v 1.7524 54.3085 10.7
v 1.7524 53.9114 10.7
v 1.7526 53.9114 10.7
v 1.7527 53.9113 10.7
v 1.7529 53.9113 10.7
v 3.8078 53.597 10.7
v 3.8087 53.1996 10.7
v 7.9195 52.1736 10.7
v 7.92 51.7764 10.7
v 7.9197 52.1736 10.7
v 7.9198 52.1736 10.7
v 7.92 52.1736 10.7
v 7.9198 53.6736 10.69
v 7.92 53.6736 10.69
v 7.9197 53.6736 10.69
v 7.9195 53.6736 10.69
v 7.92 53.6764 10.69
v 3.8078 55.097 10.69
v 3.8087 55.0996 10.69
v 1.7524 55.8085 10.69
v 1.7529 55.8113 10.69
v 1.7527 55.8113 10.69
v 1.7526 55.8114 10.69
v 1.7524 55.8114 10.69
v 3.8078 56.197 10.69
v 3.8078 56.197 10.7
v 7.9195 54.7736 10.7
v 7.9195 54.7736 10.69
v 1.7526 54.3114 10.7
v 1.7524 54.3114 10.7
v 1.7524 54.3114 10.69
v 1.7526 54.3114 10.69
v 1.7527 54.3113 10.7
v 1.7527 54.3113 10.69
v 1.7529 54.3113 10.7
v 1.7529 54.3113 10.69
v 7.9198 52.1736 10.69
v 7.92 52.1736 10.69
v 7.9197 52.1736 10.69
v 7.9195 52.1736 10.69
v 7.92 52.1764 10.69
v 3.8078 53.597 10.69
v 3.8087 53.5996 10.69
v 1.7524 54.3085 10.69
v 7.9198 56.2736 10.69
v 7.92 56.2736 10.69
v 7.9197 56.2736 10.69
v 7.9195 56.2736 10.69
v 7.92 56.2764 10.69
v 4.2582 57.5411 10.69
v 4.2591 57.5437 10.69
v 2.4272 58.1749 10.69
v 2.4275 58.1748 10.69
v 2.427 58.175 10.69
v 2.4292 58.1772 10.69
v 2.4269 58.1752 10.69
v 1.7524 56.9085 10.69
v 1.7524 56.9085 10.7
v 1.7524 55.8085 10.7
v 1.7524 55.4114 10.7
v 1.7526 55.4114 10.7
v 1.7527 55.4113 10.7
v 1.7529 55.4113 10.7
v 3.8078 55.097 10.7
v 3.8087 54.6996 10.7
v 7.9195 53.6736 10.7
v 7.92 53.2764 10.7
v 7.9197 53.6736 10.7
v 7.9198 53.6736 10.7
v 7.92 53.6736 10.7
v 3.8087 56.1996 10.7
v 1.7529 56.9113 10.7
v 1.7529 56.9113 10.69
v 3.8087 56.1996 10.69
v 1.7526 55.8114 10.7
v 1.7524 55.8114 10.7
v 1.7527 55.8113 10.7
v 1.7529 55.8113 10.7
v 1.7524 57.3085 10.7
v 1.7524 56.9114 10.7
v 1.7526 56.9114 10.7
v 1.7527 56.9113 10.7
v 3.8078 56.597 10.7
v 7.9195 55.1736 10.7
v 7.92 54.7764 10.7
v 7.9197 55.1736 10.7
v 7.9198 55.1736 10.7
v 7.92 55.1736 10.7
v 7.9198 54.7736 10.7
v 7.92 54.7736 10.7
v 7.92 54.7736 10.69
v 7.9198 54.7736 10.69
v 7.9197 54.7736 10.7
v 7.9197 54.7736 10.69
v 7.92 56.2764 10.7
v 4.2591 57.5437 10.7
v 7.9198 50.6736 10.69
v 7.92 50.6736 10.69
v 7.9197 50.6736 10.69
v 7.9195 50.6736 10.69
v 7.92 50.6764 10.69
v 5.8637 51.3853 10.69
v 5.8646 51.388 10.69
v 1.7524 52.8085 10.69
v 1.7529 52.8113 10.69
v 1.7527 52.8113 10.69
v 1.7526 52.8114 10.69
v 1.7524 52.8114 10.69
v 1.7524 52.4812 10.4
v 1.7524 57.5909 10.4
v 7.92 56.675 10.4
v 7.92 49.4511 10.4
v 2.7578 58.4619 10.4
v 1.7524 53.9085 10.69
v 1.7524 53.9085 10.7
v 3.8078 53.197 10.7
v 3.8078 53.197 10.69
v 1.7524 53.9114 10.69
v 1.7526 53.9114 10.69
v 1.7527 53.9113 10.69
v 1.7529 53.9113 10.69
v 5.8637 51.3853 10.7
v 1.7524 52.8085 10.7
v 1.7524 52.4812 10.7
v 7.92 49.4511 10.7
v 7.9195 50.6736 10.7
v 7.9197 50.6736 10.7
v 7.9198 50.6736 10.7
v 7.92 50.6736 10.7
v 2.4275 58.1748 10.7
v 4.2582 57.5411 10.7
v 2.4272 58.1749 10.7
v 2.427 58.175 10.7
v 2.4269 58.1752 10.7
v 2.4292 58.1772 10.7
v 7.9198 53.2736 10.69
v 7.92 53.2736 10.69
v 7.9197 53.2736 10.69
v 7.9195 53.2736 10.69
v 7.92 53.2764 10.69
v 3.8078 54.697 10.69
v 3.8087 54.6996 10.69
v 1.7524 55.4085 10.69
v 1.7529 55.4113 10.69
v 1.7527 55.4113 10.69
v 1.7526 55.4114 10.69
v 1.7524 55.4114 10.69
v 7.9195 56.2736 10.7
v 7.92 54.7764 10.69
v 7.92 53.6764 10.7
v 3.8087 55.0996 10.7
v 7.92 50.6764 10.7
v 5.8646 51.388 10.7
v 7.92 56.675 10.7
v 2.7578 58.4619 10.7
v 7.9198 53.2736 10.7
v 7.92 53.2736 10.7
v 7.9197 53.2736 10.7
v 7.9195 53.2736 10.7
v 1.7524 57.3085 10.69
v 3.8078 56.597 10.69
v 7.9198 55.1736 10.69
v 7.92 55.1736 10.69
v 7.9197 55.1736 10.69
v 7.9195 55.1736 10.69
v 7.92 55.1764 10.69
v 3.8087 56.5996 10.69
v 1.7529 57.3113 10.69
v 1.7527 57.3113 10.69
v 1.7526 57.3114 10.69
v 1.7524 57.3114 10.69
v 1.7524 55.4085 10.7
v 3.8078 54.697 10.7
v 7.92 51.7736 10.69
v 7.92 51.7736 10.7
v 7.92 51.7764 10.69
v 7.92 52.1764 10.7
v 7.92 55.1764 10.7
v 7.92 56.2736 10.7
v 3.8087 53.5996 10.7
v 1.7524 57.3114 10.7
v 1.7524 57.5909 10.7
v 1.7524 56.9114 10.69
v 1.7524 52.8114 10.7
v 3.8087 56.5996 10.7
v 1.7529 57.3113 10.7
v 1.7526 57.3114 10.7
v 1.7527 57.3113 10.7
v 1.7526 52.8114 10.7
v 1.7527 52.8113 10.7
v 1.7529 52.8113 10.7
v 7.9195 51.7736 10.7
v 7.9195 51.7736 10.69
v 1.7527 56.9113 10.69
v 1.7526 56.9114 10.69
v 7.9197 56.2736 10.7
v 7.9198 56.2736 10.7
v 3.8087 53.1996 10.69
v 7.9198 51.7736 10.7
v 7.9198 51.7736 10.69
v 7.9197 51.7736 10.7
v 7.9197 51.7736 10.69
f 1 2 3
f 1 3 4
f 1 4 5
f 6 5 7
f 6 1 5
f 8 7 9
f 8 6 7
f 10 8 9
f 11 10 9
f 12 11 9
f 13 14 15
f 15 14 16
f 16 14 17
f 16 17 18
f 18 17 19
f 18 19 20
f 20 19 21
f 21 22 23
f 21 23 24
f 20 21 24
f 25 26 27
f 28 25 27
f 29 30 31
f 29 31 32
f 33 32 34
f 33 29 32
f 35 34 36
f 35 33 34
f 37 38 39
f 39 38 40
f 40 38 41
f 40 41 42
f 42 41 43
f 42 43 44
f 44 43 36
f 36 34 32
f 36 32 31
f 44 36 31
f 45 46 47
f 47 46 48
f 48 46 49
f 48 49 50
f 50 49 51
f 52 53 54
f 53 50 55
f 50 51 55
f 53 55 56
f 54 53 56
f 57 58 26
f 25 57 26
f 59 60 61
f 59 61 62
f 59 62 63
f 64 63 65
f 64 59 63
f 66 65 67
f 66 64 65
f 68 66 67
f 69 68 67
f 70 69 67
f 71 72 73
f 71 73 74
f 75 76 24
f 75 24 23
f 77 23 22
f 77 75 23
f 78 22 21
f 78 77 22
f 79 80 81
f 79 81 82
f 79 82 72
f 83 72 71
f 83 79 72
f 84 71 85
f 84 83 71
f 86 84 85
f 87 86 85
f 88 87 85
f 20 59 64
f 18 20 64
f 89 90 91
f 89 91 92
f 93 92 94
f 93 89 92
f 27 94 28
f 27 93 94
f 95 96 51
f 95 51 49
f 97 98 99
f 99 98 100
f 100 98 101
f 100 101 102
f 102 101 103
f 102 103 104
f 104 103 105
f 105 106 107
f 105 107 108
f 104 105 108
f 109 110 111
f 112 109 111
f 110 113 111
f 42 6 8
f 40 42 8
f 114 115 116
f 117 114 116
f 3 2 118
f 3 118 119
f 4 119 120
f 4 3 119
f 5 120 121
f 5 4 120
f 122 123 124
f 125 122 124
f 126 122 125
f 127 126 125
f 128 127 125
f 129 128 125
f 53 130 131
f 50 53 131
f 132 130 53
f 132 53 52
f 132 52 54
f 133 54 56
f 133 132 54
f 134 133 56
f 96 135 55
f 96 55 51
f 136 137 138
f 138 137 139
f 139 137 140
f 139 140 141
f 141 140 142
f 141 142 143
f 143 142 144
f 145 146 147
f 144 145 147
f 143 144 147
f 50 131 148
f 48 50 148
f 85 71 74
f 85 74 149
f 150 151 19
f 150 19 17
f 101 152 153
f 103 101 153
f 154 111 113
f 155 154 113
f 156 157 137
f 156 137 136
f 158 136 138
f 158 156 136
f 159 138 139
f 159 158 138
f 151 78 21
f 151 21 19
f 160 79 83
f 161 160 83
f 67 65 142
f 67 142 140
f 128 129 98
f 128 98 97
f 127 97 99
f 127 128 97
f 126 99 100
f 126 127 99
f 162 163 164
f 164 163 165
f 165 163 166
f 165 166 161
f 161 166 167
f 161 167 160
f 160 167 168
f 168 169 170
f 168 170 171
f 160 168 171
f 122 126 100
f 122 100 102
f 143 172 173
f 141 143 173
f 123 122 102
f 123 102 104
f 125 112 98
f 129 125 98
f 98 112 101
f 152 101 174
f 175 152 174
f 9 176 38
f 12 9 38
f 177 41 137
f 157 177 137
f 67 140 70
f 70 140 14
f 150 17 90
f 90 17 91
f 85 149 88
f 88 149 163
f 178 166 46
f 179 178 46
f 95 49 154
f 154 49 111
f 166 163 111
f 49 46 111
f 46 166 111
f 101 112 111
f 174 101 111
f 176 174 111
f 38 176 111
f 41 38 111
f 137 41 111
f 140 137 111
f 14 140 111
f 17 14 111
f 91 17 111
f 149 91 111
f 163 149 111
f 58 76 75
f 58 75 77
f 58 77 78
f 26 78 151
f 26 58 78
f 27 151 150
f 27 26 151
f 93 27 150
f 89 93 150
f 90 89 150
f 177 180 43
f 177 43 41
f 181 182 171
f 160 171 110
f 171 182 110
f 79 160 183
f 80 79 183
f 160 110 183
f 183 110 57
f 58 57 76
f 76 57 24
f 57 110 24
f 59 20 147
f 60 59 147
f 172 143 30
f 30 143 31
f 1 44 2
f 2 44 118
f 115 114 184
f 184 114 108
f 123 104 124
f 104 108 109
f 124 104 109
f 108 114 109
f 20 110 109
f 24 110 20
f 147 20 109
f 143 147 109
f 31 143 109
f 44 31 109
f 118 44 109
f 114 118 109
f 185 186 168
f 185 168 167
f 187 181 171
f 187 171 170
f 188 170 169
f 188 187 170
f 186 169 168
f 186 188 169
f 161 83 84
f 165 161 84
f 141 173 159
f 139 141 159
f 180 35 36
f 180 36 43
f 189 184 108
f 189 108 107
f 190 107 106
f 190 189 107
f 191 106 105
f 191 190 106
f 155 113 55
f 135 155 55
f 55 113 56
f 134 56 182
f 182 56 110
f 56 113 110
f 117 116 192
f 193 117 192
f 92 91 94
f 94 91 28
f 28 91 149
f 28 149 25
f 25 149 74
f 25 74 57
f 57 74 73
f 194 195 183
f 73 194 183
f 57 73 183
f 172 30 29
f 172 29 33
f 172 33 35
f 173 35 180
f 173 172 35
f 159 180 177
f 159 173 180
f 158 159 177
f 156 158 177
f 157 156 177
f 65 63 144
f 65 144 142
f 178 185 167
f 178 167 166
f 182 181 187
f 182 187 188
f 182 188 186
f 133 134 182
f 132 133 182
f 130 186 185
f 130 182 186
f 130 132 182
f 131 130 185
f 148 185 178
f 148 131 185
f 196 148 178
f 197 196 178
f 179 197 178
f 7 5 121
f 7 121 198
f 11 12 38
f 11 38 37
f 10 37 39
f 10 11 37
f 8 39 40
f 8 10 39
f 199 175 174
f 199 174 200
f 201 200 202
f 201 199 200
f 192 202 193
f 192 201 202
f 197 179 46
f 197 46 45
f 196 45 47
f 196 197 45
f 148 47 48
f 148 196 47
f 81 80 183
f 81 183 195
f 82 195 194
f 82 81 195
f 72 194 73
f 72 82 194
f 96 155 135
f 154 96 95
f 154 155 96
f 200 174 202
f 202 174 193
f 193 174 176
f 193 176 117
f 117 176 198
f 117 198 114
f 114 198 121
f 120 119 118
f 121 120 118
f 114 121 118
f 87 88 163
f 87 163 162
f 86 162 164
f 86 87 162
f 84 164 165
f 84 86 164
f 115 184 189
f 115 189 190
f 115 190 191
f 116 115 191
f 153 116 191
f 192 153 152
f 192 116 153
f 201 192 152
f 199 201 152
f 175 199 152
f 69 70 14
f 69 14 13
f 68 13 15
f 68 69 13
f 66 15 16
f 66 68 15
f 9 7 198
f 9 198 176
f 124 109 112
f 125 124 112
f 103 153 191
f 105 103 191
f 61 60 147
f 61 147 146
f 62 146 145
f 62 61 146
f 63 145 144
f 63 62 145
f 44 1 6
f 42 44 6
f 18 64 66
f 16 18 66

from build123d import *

# Parameters (mm, degrees)
PAD002_DEPTH    = 0.3
POCKET008_DEPTH = 0.01
POCKET009_DEPTH = 0.01


with BuildPart() as part:
    # Sketch009 (on Face1 of Binder002) → Pad002 (new body)
    with BuildSketch(Plane.XY.offset(10.4)):
        Polygon((1.7523997574, 57.5908510487), (1.7523997574, 52.4812141451), (7.92, 49.4510973901), (7.92, 56.6749555236), (2.7578069465, 58.4619401658), align=None)
    extrude(amount=PAD002_DEPTH)

    # Sketch010 (on Face7 of Pad002) → Pocket008 (cut)
    with BuildSketch(Plane.XY.offset(10.7)):
        with BuildLine():
            ThreePointArc((2.4274707916, 58.1748075445), (2.4266041369, 58.1765918899), (2.4283884823, 58.1774585447))
            Line((2.4283884823, 58.1774585447), (4.2590786033, 57.5437327043))
            Line((4.2590786033, 57.5437327043), (7.9204588453, 56.2762810237))
            ThreePointArc((7.9204588453, 56.2762810237), (7.9213255001, 56.2744966783), (7.9195411547, 56.2736300236))
            Line((4.2581609127, 57.5410817042), (7.9195411547, 56.2736300236))
            Line((2.4274707916, 58.1748075445), (4.2581609127, 57.5410817042))
        make_face()
        with BuildLine():
            ThreePointArc((7.9204588453, 50.6762810237), (7.9213255001, 50.6744966783), (7.9195411547, 50.6736300236))
            Line((7.9195411547, 50.6736300236), (5.8636744071, 51.3853047451))
            Line((5.8636744071, 51.3853047451), (1.7519409121, 52.8086541883))
            ThreePointArc((1.7519409121, 52.8086541883), (1.7510742574, 52.8104385337), (1.7528586028, 52.8113051884))
            Line((5.8645920978, 51.3879557453), (1.7528586028, 52.8113051884))
            Line((7.9204588453, 50.6762810237), (5.8645920978, 51.3879557453))
        make_face()
        with BuildLine():
            ThreePointArc((1.7519409121, 53.9086541883), (1.7510742574, 53.9104385337), (1.7528586028, 53.9113051884))
            Line((1.7528586028, 53.9113051884), (3.8087253503, 53.1996304668))
            Line((3.8087253503, 53.1996304668), (7.9204588453, 51.7762810237))
            ThreePointArc((7.9204588453, 51.7762810237), (7.9213255001, 51.7744966783), (7.9195411547, 51.7736300236))
            Line((3.8078076596, 53.1969794667), (7.9195411547, 51.7736300236))
            Line((1.7519409121, 53.9086541883), (3.8078076596, 53.1969794667))
        make_face()
        with BuildLine():
            ThreePointArc((1.7519409121, 54.3086541883), (1.7510742574, 54.3104385337), (1.7528586028, 54.3113051884))
            Line((1.7528586028, 54.3113051884), (3.8087253503, 53.5996304668))
            Line((3.8087253503, 53.5996304668), (7.9204588453, 52.1762810237))
            ThreePointArc((7.9204588453, 52.1762810237), (7.9213255001, 52.1744966783), (7.9195411547, 52.1736300236))
            Line((3.8078076596, 53.5969794667), (7.9195411547, 52.1736300236))
            Line((1.7519409121, 54.3086541883), (3.8078076596, 53.5969794667))
        make_face()
        with BuildLine():
            ThreePointArc((1.7519409121, 55.4086541883), (1.7510742574, 55.4104385337), (1.7528586028, 55.4113051884))
            Line((1.7528586028, 55.4113051884), (3.8087253503, 54.6996304668))
            Line((3.8087253503, 54.6996304668), (7.9204588453, 53.2762810237))
            ThreePointArc((7.9204588453, 53.2762810237), (7.9213255001, 53.2744966783), (7.9195411547, 53.2736300236))
            Line((3.8078076596, 54.6969794667), (7.9195411547, 53.2736300236))
            Line((1.7519409121, 55.4086541883), (3.8078076596, 54.6969794667))
        make_face()
        with BuildLine():
            ThreePointArc((1.7519409121, 55.8086541883), (1.7510742574, 55.8104385337), (1.7528586028, 55.8113051884))
            Line((1.7528586028, 55.8113051884), (3.8087253503, 55.0996304668))
            Line((3.8087253503, 55.0996304668), (7.9204588453, 53.6762810237))
            ThreePointArc((7.9204588453, 53.6762810237), (7.9213255001, 53.6744966783), (7.9195411547, 53.6736300236))
            Line((3.8078076596, 55.0969794667), (7.9195411547, 53.6736300236))
            Line((1.7519409121, 55.8086541883), (3.8078076596, 55.0969794667))
        make_face()
        with BuildLine():
            ThreePointArc((1.7519409121, 56.9086541883), (1.7510742574, 56.9104385337), (1.7528586028, 56.9113051884))
            Line((1.7528586028, 56.9113051884), (3.8087253503, 56.1996304668))
            Line((3.8087253503, 56.1996304668), (7.9204588453, 54.7762810237))
            ThreePointArc((7.9204588453, 54.7762810237), (7.9213255001, 54.7744966783), (7.9195411547, 54.7736300236))
            Line((3.8078076596, 56.1969794667), (7.9195411547, 54.7736300236))
            Line((1.7519409121, 56.9086541883), (3.8078076596, 56.1969794667))
        make_face()
        with BuildLine():
            ThreePointArc((1.7519409121, 57.3086541883), (1.7510742574, 57.3104385337), (1.7528586028, 57.3113051884))
            Line((1.7528586028, 57.3113051884), (3.8087253503, 56.5996304668))
            Line((3.8087253503, 56.5996304668), (7.9204588453, 55.1762810237))
            ThreePointArc((7.9204588453, 55.1762810237), (7.9213255001, 55.1744966783), (7.9195411547, 55.1736300236))
            Line((3.8078076596, 56.5969794667), (7.9195411547, 55.1736300236))
            Line((1.7519409121, 57.3086541883), (3.8078076596, 56.5969794667))
        make_face()
    extrude(amount=-POCKET008_DEPTH, mode=Mode.SUBTRACT)

    # Sketch010 (on Face7 of Pad002) → Pocket009 (cut)
    with BuildSketch(Plane.XY.offset(10.7)):
        with BuildLine():
            ThreePointArc((2.4274707916, 58.1748075445), (2.4266041369, 58.1765918899), (2.4283884823, 58.1774585447))
            Line((2.4283884823, 58.1774585447), (4.2590786033, 57.5437327043))
            Line((4.2590786033, 57.5437327043), (7.9204588453, 56.2762810237))
            ThreePointArc((7.9204588453, 56.2762810237), (7.9213255001, 56.2744966783), (7.9195411547, 56.2736300236))
            Line((4.2581609127, 57.5410817042), (7.9195411547, 56.2736300236))
            Line((2.4274707916, 58.1748075445), (4.2581609127, 57.5410817042))
        make_face()
        with BuildLine():
            ThreePointArc((7.9204588453, 50.6762810237), (7.9213255001, 50.6744966783), (7.9195411547, 50.6736300236))
            Line((7.9195411547, 50.6736300236), (5.8636744071, 51.3853047451))
            Line((5.8636744071, 51.3853047451), (1.7519409121, 52.8086541883))
            ThreePointArc((1.7519409121, 52.8086541883), (1.7510742574, 52.8104385337), (1.7528586028, 52.8113051884))
            Line((5.8645920978, 51.3879557453), (1.7528586028, 52.8113051884))
            Line((7.9204588453, 50.6762810237), (5.8645920978, 51.3879557453))
        make_face()
        with BuildLine():
            ThreePointArc((1.7519409121, 53.9086541883), (1.7510742574, 53.9104385337), (1.7528586028, 53.9113051884))
            Line((1.7528586028, 53.9113051884), (3.8087253503, 53.1996304668))
            Line((3.8087253503, 53.1996304668), (7.9204588453, 51.7762810237))
            ThreePointArc((7.9204588453, 51.7762810237), (7.9213255001, 51.7744966783), (7.9195411547, 51.7736300236))
            Line((3.8078076596, 53.1969794667), (7.9195411547, 51.7736300236))
            Line((1.7519409121, 53.9086541883), (3.8078076596, 53.1969794667))
        make_face()
        with BuildLine():
            ThreePointArc((1.7519409121, 54.3086541883), (1.7510742574, 54.3104385337), (1.7528586028, 54.3113051884))
            Line((1.7528586028, 54.3113051884), (3.8087253503, 53.5996304668))
            Line((3.8087253503, 53.5996304668), (7.9204588453, 52.1762810237))
            ThreePointArc((7.9204588453, 52.1762810237), (7.9213255001, 52.1744966783), (7.9195411547, 52.1736300236))
            Line((3.8078076596, 53.5969794667), (7.9195411547, 52.1736300236))
            Line((1.7519409121, 54.3086541883), (3.8078076596, 53.5969794667))
        make_face()
        with BuildLine():
            ThreePointArc((1.7519409121, 55.4086541883), (1.7510742574, 55.4104385337), (1.7528586028, 55.4113051884))
            Line((1.7528586028, 55.4113051884), (3.8087253503, 54.6996304668))
            Line((3.8087253503, 54.6996304668), (7.9204588453, 53.2762810237))
            ThreePointArc((7.9204588453, 53.2762810237), (7.9213255001, 53.2744966783), (7.9195411547, 53.2736300236))
            Line((3.8078076596, 54.6969794667), (7.9195411547, 53.2736300236))
            Line((1.7519409121, 55.4086541883), (3.8078076596, 54.6969794667))
        make_face()
        with BuildLine():
            ThreePointArc((1.7519409121, 55.8086541883), (1.7510742574, 55.8104385337), (1.7528586028, 55.8113051884))
            Line((1.7528586028, 55.8113051884), (3.8087253503, 55.0996304668))
            Line((3.8087253503, 55.0996304668), (7.9204588453, 53.6762810237))
            ThreePointArc((7.9204588453, 53.6762810237), (7.9213255001, 53.6744966783), (7.9195411547, 53.6736300236))
            Line((3.8078076596, 55.0969794667), (7.9195411547, 53.6736300236))
            Line((1.7519409121, 55.8086541883), (3.8078076596, 55.0969794667))
        make_face()
        with BuildLine():
            ThreePointArc((1.7519409121, 56.9086541883), (1.7510742574, 56.9104385337), (1.7528586028, 56.9113051884))
            Line((1.7528586028, 56.9113051884), (3.8087253503, 56.1996304668))
            Line((3.8087253503, 56.1996304668), (7.9204588453, 54.7762810237))
            ThreePointArc((7.9204588453, 54.7762810237), (7.9213255001, 54.7744966783), (7.9195411547, 54.7736300236))
            Line((3.8078076596, 56.1969794667), (7.9195411547, 54.7736300236))
            Line((1.7519409121, 56.9086541883), (3.8078076596, 56.1969794667))
        make_face()
        with BuildLine():
            ThreePointArc((1.7519409121, 57.3086541883), (1.7510742574, 57.3104385337), (1.7528586028, 57.3113051884))
            Line((1.7528586028, 57.3113051884), (3.8087253503, 56.5996304668))
            Line((3.8087253503, 56.5996304668), (7.9204588453, 55.1762810237))
            ThreePointArc((7.9204588453, 55.1762810237), (7.9213255001, 55.1744966783), (7.9195411547, 55.1736300236))
            Line((3.8078076596, 56.5969794667), (7.9195411547, 55.1736300236))
            Line((1.7519409121, 57.3086541883), (3.8078076596, 56.5969794667))
        make_face()
    extrude(amount=-POCKET009_DEPTH, mode=Mode.SUBTRACT)


solid = part.part
